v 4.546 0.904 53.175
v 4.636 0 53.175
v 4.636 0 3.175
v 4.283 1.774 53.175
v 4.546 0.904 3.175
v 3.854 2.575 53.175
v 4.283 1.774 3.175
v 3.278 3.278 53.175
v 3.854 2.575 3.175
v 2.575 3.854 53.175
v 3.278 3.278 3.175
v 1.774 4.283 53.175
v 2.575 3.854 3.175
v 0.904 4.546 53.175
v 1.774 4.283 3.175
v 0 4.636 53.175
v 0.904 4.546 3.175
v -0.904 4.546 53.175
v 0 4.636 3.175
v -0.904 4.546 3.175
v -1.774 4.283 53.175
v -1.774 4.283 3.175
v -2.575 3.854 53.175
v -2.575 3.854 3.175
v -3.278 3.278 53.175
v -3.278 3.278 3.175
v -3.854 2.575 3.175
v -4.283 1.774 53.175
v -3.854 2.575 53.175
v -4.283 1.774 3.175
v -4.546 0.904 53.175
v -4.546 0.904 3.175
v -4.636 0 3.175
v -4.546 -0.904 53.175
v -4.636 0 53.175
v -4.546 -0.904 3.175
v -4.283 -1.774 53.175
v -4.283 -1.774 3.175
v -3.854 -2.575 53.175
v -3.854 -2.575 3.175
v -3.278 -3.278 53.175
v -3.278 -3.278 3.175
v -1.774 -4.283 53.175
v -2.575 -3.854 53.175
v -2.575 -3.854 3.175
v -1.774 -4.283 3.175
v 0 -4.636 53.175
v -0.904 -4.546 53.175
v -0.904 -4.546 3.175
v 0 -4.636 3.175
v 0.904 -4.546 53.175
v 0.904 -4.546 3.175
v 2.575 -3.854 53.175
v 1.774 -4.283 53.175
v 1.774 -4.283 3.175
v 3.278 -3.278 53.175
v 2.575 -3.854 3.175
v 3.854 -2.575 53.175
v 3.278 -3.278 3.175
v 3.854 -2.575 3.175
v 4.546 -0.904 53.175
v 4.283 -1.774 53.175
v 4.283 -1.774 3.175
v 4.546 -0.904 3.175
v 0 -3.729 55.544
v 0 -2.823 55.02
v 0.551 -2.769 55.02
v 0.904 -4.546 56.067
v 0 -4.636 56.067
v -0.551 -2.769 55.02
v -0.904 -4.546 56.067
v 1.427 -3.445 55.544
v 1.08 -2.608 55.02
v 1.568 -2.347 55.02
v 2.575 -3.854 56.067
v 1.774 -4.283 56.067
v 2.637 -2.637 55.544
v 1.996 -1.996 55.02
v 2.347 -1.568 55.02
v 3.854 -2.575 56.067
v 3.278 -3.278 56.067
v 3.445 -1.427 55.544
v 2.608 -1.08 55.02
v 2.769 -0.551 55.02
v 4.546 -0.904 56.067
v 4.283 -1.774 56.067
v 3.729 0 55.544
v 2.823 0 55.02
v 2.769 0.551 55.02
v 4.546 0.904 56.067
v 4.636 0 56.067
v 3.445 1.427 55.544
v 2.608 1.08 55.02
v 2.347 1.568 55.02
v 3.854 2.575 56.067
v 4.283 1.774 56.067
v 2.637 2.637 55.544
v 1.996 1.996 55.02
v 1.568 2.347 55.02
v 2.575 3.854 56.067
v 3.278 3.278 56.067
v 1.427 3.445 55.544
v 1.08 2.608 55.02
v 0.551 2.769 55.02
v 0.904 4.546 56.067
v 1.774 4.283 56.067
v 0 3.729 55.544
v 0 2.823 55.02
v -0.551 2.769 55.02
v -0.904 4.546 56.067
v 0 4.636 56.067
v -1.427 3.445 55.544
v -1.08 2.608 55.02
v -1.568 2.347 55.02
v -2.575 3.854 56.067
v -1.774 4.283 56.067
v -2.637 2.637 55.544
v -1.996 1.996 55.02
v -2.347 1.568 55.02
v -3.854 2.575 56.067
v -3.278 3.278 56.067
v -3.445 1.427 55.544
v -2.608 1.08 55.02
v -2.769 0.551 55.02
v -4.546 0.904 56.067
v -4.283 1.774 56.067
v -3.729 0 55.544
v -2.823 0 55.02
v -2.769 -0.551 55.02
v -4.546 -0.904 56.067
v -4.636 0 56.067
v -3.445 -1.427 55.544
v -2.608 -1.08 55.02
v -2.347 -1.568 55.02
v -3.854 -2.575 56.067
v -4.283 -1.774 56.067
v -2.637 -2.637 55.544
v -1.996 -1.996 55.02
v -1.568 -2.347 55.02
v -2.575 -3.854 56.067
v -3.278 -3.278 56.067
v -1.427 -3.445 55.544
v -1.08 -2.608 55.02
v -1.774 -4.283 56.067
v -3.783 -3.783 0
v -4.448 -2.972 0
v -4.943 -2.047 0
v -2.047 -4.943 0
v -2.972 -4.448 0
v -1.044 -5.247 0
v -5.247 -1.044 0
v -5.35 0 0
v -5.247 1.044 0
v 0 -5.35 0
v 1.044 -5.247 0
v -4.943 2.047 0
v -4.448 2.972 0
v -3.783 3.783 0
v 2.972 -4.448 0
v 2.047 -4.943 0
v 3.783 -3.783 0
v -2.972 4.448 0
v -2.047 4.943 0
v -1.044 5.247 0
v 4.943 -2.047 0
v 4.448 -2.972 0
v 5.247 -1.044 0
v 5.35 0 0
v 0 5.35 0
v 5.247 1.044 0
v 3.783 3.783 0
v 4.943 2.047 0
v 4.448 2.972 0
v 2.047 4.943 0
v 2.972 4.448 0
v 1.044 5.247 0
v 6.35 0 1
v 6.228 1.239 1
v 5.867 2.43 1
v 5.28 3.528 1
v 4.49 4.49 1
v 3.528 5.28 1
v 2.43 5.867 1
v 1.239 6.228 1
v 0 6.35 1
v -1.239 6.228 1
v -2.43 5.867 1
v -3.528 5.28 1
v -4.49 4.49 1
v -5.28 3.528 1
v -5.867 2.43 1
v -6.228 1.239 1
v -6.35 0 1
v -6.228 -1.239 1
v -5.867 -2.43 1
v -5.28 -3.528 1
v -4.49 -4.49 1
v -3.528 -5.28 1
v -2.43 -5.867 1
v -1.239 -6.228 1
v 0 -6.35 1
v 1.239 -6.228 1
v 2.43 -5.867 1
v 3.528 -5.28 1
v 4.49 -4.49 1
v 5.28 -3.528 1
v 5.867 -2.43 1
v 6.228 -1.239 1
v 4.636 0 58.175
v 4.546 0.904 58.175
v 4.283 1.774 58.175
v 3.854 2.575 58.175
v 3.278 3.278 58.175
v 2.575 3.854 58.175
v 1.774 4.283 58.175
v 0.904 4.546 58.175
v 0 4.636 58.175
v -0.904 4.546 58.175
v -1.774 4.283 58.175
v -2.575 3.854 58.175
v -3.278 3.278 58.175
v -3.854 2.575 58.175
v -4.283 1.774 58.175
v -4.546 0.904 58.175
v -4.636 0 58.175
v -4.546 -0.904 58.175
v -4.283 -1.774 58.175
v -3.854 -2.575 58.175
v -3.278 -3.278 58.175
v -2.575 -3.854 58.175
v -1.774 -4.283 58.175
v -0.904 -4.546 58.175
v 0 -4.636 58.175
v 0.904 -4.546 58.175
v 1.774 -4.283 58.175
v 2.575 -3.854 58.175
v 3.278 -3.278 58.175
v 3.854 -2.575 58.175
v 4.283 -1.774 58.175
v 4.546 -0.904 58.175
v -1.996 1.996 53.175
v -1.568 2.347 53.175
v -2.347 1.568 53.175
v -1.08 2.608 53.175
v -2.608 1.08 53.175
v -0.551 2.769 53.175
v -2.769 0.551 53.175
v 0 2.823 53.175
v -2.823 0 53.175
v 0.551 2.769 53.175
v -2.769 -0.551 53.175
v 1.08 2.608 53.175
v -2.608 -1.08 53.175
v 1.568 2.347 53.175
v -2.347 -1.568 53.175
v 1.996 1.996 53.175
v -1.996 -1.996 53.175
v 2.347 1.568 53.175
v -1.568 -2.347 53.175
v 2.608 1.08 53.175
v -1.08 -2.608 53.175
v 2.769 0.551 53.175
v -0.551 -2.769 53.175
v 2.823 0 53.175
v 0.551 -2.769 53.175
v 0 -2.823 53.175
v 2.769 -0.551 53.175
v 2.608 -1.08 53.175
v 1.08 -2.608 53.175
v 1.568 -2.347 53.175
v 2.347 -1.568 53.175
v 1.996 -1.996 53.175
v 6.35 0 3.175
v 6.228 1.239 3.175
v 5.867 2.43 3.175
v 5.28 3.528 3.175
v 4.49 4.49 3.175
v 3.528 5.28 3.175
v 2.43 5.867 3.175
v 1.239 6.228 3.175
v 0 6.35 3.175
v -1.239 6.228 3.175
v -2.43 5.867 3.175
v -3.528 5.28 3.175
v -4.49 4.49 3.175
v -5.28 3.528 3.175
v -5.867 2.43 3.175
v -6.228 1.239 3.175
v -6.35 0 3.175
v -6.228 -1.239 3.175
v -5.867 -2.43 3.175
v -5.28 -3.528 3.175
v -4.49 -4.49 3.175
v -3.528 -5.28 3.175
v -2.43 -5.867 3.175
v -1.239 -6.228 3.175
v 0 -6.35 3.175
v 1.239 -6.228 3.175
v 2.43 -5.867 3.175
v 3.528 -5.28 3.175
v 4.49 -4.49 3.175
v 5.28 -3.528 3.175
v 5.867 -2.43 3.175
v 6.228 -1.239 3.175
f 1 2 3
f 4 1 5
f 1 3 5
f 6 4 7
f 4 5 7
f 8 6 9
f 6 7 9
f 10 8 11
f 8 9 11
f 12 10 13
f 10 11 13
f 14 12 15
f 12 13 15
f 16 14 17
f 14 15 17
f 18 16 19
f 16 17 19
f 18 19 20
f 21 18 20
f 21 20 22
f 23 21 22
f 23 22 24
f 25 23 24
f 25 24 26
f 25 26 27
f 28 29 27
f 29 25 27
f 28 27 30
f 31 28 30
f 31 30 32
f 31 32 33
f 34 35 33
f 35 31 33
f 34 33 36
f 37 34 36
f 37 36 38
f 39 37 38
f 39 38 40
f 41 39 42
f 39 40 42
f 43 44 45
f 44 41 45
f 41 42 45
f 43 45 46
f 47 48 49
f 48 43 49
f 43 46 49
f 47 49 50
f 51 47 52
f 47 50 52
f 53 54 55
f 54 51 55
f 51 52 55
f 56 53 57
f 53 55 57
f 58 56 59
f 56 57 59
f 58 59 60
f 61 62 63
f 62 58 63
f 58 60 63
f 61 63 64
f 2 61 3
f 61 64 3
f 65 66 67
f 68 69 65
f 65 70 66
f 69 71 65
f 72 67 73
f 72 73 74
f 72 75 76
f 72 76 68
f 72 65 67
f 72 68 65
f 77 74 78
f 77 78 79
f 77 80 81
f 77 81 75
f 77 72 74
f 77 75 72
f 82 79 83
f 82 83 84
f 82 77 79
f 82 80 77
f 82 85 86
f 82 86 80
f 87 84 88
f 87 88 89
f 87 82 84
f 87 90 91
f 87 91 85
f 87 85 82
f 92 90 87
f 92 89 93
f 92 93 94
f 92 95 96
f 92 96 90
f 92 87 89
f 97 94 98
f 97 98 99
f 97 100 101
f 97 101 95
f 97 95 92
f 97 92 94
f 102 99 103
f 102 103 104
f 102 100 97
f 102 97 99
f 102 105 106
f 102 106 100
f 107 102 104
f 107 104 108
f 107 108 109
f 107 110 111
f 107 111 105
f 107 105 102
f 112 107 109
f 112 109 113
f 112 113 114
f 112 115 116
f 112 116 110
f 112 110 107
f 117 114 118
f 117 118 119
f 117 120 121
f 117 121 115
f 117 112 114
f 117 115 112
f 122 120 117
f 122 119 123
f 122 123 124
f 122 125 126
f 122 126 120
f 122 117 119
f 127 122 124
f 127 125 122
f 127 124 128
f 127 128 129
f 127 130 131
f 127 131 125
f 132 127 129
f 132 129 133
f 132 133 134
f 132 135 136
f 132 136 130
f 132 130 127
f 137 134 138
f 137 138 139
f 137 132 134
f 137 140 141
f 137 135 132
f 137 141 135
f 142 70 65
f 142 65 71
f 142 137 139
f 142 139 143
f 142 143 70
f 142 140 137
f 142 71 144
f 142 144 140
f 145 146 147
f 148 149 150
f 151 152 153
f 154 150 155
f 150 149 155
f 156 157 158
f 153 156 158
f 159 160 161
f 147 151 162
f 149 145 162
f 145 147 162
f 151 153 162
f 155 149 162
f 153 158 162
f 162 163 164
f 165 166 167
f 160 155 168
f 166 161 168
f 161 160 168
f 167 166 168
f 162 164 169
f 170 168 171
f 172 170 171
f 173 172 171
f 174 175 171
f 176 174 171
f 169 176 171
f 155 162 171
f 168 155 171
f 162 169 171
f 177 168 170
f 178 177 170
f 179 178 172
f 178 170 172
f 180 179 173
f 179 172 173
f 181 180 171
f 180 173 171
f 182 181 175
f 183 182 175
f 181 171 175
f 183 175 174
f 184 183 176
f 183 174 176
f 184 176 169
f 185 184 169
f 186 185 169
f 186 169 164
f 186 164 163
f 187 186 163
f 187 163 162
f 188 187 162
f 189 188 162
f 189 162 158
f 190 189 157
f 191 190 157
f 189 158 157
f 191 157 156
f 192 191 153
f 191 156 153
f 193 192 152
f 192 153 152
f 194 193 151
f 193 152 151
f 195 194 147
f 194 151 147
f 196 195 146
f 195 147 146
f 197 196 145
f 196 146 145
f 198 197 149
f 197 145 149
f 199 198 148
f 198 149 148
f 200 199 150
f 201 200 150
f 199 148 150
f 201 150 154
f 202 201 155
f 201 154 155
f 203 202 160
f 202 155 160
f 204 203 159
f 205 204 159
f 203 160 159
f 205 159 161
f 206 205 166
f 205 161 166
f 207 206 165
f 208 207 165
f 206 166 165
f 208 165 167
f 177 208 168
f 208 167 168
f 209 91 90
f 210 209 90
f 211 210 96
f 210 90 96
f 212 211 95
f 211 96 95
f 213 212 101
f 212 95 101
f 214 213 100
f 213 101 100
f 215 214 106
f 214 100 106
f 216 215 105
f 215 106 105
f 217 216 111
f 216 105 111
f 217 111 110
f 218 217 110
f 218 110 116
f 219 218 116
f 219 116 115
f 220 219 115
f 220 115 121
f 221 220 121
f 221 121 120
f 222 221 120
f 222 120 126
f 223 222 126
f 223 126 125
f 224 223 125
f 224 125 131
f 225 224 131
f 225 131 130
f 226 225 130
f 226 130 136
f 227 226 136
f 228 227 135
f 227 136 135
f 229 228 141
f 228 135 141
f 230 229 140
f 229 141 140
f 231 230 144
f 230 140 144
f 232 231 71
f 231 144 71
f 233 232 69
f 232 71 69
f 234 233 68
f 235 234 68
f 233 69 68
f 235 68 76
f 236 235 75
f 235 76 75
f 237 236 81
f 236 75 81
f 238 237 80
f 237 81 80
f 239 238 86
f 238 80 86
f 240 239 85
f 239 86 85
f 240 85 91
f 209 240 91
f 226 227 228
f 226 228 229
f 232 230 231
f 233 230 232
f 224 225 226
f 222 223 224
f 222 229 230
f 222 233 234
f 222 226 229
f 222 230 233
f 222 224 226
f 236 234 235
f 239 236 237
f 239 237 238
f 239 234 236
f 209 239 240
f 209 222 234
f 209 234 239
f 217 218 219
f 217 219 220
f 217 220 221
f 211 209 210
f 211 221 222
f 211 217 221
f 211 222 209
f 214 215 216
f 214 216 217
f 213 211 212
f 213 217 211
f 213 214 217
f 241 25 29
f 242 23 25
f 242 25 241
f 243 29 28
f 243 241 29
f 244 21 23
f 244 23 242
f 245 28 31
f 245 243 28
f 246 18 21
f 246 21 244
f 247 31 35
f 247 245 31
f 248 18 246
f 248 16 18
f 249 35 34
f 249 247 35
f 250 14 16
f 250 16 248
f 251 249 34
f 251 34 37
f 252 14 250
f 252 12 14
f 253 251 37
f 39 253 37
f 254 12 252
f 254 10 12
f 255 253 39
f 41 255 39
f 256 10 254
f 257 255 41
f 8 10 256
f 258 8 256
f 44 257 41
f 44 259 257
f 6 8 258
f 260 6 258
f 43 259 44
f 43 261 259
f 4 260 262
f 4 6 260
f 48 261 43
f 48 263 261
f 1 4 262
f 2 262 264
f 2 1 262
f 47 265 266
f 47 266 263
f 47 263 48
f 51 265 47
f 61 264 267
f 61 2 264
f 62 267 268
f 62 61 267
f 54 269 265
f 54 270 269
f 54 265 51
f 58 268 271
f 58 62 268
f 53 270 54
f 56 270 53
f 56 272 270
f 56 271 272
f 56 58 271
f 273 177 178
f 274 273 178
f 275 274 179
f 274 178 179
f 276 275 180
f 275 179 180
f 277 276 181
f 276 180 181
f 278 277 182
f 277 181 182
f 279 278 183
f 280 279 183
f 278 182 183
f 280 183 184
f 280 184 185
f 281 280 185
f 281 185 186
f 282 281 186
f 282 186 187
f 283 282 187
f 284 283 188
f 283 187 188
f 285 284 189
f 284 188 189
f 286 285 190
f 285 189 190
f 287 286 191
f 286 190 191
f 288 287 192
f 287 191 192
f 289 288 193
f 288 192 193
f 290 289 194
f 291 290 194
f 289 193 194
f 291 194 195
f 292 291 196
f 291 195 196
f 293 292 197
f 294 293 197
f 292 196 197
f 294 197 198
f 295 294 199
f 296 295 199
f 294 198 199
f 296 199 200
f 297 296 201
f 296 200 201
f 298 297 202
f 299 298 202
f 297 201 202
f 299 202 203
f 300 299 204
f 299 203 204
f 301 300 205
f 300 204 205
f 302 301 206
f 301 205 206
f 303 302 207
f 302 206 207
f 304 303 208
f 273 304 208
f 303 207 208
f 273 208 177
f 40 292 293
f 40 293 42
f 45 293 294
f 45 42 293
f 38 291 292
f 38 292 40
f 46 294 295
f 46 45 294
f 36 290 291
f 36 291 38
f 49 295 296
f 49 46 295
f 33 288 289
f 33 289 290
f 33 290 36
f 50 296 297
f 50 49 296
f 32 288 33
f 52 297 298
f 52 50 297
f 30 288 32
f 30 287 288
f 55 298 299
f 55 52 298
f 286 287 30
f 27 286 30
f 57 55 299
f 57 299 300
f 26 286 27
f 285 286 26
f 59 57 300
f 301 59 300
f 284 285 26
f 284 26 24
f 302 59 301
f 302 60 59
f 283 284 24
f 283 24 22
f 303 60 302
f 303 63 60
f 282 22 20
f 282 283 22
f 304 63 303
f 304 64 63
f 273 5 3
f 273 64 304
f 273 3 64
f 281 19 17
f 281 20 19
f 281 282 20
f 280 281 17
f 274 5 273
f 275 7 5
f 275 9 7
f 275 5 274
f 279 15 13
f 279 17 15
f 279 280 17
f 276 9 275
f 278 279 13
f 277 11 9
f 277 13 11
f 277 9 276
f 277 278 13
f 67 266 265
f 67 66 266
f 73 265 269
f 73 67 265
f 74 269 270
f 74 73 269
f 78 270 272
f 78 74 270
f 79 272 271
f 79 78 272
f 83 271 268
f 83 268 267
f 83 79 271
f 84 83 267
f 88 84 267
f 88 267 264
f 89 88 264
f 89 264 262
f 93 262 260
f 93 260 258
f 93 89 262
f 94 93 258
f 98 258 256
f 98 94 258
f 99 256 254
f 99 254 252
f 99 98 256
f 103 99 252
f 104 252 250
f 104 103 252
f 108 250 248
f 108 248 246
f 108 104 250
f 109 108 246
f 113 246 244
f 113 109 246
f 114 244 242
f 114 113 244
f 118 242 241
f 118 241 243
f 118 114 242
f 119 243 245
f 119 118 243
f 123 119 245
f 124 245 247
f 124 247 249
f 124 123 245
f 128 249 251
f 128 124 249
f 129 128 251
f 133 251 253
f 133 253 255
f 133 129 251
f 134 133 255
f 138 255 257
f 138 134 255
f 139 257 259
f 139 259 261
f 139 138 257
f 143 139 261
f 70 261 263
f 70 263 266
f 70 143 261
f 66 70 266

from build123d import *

# Parameters (mm, degrees)
F0_R     = 6.35
F1_DEPTH = 3.175
F2_R     = 4.6355
F3_DEPTH = 55
F6_SIZE  = 1


# Not quite as in the source:
# - a length typed as a fraction of an inch, garbled in the dataset ("3 / 203.2 mm" for 3/8 in), is restored


with BuildPart() as f1:
    # F0 (on Top) → F1 (new body)
    with BuildSketch(Plane.XY):
        Circle(F0_R)
    extrude(amount=F1_DEPTH)

    # F2 (on face) → F3 (join)
    with BuildSketch(Plane.XY.offset(3.175)):
        Circle(F2_R)
    extrude(amount=F3_DEPTH)

    # F4 (on Right) → F5 (revolve, cut)
    with BuildSketch(Plane.YZ):
        Polygon((-2.8230392858, 55.0202994616), (-4.8230392858, 56.175), (-4.8230392858, 53.175), (-2.8230392858, 53.175), align=None)
    revolve(axis=Axis((0, 0, 58.175), (0, 0, 1)), mode=Mode.SUBTRACT)

    # F6
    f6_edges = [f1.edges().sort_by_distance(p)[0] for p in [
        (-6.35, 0, 0),
    ]]
    chamfer(f6_edges, length=F6_SIZE)


solid = f1.part
